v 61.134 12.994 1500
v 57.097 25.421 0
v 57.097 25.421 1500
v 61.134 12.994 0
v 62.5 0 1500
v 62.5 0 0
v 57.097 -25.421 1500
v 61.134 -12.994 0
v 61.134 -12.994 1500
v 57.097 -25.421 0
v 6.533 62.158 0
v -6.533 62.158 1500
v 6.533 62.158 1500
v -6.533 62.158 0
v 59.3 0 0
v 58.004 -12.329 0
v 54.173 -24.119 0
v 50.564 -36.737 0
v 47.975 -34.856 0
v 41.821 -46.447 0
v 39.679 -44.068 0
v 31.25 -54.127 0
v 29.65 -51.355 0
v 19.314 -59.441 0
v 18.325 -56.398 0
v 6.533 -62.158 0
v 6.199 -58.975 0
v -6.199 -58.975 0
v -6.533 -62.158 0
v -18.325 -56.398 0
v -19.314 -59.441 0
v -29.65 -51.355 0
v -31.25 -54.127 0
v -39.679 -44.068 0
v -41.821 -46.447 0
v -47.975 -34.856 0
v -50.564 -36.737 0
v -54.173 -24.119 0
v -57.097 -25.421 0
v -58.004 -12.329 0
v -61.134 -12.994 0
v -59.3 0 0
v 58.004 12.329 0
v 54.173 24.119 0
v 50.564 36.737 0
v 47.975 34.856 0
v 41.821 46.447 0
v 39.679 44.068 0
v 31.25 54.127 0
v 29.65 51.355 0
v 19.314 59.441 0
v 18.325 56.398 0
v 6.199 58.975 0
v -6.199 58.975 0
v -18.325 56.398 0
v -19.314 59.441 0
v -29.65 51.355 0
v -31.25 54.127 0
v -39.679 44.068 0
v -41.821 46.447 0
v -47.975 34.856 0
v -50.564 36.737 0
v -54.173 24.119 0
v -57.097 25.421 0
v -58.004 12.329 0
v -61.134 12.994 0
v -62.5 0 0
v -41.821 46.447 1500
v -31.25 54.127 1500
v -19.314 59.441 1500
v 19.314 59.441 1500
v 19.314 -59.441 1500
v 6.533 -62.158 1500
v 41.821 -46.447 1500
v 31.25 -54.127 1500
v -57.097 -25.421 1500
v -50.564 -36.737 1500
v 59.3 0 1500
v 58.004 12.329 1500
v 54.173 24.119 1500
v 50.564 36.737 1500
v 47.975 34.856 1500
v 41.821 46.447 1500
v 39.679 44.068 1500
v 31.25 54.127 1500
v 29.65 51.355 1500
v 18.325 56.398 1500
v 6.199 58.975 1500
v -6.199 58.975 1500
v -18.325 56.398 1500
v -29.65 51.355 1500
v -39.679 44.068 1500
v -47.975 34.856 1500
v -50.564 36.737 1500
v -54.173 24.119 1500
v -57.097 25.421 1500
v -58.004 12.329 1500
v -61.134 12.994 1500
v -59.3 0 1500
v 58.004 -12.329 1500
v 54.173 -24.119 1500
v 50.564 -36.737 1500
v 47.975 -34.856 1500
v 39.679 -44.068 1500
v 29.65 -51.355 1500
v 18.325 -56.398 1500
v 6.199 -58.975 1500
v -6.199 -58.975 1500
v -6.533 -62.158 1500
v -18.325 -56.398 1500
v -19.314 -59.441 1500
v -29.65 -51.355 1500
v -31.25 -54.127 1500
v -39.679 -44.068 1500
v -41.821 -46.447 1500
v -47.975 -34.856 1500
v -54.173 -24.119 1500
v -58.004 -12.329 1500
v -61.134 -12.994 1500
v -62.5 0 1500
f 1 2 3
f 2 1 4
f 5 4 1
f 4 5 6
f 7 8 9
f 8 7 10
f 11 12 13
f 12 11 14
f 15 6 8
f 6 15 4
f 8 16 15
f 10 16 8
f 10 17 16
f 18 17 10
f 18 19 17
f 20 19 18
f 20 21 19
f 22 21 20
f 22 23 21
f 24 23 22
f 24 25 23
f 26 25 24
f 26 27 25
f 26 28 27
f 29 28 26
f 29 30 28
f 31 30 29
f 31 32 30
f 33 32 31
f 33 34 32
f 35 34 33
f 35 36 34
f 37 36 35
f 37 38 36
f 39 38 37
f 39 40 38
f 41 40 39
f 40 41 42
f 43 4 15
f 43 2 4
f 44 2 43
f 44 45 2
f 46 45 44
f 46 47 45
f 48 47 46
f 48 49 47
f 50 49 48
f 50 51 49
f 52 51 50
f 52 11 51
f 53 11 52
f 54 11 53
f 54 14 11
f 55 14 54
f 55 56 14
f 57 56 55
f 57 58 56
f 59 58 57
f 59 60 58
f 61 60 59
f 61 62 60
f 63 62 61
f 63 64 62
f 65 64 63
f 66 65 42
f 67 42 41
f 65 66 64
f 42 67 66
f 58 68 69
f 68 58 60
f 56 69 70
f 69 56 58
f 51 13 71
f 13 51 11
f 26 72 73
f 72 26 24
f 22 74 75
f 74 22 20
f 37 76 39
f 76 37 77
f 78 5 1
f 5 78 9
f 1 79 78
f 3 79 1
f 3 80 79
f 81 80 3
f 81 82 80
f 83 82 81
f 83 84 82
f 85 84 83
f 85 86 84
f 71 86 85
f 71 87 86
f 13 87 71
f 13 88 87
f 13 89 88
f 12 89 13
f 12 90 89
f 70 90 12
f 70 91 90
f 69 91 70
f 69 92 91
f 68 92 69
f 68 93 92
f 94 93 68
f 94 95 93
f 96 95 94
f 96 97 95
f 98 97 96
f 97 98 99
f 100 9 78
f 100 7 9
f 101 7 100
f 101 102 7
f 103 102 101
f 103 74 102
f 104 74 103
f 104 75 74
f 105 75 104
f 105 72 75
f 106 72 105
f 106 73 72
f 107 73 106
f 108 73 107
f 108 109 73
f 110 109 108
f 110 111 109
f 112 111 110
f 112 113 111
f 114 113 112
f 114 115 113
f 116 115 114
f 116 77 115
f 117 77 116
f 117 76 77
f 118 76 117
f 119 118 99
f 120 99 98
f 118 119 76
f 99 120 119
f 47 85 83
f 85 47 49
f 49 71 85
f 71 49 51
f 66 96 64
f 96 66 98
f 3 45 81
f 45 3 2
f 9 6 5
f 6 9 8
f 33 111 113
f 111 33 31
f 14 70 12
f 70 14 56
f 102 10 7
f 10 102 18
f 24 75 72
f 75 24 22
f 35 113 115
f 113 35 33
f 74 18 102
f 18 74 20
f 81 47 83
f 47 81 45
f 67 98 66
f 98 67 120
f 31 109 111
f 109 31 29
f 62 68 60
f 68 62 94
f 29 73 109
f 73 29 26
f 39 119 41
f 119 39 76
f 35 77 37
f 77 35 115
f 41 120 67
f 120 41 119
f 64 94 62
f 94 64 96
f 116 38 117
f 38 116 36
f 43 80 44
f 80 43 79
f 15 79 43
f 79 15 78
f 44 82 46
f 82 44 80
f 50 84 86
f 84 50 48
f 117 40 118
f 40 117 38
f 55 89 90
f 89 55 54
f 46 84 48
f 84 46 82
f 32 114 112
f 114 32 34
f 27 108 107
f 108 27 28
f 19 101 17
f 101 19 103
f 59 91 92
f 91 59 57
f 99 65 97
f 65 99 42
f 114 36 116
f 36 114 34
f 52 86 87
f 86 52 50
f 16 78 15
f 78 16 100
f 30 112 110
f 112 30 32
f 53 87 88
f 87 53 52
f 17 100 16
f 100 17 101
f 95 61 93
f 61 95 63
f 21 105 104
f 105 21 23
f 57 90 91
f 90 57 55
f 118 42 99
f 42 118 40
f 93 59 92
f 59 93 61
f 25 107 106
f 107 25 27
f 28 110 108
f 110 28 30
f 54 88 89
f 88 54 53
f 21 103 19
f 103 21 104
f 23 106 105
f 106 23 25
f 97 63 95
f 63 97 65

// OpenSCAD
// Parameters
outer_diameter_mm = 125; //[80:250:1]
wall_thickness_mm = 3.2; //[1.6:6.4:0.1]
length_mm = 1500; //[750:3000:1]
overlap_mm = 1; //[0.5:2:0.1]

// HT Pipe - complete geometry
module ht_pipe() {
  color([0.85, 0.85, 0.8]) { // Off-white for PVC
    difference() {
      // Outer pipe
      cylinder(h=length_mm, r=outer_diameter_mm/2, center=false);
      // Inner bore
      translate([0, 0, -overlap_mm])
        cylinder(h=length_mm + 2*overlap_mm, r=outer_diameter_mm/2 - wall_thickness_mm, center=false);
    }
  }
}

// Assembly
module assembly() {
  ht_pipe();
}

assembly();
